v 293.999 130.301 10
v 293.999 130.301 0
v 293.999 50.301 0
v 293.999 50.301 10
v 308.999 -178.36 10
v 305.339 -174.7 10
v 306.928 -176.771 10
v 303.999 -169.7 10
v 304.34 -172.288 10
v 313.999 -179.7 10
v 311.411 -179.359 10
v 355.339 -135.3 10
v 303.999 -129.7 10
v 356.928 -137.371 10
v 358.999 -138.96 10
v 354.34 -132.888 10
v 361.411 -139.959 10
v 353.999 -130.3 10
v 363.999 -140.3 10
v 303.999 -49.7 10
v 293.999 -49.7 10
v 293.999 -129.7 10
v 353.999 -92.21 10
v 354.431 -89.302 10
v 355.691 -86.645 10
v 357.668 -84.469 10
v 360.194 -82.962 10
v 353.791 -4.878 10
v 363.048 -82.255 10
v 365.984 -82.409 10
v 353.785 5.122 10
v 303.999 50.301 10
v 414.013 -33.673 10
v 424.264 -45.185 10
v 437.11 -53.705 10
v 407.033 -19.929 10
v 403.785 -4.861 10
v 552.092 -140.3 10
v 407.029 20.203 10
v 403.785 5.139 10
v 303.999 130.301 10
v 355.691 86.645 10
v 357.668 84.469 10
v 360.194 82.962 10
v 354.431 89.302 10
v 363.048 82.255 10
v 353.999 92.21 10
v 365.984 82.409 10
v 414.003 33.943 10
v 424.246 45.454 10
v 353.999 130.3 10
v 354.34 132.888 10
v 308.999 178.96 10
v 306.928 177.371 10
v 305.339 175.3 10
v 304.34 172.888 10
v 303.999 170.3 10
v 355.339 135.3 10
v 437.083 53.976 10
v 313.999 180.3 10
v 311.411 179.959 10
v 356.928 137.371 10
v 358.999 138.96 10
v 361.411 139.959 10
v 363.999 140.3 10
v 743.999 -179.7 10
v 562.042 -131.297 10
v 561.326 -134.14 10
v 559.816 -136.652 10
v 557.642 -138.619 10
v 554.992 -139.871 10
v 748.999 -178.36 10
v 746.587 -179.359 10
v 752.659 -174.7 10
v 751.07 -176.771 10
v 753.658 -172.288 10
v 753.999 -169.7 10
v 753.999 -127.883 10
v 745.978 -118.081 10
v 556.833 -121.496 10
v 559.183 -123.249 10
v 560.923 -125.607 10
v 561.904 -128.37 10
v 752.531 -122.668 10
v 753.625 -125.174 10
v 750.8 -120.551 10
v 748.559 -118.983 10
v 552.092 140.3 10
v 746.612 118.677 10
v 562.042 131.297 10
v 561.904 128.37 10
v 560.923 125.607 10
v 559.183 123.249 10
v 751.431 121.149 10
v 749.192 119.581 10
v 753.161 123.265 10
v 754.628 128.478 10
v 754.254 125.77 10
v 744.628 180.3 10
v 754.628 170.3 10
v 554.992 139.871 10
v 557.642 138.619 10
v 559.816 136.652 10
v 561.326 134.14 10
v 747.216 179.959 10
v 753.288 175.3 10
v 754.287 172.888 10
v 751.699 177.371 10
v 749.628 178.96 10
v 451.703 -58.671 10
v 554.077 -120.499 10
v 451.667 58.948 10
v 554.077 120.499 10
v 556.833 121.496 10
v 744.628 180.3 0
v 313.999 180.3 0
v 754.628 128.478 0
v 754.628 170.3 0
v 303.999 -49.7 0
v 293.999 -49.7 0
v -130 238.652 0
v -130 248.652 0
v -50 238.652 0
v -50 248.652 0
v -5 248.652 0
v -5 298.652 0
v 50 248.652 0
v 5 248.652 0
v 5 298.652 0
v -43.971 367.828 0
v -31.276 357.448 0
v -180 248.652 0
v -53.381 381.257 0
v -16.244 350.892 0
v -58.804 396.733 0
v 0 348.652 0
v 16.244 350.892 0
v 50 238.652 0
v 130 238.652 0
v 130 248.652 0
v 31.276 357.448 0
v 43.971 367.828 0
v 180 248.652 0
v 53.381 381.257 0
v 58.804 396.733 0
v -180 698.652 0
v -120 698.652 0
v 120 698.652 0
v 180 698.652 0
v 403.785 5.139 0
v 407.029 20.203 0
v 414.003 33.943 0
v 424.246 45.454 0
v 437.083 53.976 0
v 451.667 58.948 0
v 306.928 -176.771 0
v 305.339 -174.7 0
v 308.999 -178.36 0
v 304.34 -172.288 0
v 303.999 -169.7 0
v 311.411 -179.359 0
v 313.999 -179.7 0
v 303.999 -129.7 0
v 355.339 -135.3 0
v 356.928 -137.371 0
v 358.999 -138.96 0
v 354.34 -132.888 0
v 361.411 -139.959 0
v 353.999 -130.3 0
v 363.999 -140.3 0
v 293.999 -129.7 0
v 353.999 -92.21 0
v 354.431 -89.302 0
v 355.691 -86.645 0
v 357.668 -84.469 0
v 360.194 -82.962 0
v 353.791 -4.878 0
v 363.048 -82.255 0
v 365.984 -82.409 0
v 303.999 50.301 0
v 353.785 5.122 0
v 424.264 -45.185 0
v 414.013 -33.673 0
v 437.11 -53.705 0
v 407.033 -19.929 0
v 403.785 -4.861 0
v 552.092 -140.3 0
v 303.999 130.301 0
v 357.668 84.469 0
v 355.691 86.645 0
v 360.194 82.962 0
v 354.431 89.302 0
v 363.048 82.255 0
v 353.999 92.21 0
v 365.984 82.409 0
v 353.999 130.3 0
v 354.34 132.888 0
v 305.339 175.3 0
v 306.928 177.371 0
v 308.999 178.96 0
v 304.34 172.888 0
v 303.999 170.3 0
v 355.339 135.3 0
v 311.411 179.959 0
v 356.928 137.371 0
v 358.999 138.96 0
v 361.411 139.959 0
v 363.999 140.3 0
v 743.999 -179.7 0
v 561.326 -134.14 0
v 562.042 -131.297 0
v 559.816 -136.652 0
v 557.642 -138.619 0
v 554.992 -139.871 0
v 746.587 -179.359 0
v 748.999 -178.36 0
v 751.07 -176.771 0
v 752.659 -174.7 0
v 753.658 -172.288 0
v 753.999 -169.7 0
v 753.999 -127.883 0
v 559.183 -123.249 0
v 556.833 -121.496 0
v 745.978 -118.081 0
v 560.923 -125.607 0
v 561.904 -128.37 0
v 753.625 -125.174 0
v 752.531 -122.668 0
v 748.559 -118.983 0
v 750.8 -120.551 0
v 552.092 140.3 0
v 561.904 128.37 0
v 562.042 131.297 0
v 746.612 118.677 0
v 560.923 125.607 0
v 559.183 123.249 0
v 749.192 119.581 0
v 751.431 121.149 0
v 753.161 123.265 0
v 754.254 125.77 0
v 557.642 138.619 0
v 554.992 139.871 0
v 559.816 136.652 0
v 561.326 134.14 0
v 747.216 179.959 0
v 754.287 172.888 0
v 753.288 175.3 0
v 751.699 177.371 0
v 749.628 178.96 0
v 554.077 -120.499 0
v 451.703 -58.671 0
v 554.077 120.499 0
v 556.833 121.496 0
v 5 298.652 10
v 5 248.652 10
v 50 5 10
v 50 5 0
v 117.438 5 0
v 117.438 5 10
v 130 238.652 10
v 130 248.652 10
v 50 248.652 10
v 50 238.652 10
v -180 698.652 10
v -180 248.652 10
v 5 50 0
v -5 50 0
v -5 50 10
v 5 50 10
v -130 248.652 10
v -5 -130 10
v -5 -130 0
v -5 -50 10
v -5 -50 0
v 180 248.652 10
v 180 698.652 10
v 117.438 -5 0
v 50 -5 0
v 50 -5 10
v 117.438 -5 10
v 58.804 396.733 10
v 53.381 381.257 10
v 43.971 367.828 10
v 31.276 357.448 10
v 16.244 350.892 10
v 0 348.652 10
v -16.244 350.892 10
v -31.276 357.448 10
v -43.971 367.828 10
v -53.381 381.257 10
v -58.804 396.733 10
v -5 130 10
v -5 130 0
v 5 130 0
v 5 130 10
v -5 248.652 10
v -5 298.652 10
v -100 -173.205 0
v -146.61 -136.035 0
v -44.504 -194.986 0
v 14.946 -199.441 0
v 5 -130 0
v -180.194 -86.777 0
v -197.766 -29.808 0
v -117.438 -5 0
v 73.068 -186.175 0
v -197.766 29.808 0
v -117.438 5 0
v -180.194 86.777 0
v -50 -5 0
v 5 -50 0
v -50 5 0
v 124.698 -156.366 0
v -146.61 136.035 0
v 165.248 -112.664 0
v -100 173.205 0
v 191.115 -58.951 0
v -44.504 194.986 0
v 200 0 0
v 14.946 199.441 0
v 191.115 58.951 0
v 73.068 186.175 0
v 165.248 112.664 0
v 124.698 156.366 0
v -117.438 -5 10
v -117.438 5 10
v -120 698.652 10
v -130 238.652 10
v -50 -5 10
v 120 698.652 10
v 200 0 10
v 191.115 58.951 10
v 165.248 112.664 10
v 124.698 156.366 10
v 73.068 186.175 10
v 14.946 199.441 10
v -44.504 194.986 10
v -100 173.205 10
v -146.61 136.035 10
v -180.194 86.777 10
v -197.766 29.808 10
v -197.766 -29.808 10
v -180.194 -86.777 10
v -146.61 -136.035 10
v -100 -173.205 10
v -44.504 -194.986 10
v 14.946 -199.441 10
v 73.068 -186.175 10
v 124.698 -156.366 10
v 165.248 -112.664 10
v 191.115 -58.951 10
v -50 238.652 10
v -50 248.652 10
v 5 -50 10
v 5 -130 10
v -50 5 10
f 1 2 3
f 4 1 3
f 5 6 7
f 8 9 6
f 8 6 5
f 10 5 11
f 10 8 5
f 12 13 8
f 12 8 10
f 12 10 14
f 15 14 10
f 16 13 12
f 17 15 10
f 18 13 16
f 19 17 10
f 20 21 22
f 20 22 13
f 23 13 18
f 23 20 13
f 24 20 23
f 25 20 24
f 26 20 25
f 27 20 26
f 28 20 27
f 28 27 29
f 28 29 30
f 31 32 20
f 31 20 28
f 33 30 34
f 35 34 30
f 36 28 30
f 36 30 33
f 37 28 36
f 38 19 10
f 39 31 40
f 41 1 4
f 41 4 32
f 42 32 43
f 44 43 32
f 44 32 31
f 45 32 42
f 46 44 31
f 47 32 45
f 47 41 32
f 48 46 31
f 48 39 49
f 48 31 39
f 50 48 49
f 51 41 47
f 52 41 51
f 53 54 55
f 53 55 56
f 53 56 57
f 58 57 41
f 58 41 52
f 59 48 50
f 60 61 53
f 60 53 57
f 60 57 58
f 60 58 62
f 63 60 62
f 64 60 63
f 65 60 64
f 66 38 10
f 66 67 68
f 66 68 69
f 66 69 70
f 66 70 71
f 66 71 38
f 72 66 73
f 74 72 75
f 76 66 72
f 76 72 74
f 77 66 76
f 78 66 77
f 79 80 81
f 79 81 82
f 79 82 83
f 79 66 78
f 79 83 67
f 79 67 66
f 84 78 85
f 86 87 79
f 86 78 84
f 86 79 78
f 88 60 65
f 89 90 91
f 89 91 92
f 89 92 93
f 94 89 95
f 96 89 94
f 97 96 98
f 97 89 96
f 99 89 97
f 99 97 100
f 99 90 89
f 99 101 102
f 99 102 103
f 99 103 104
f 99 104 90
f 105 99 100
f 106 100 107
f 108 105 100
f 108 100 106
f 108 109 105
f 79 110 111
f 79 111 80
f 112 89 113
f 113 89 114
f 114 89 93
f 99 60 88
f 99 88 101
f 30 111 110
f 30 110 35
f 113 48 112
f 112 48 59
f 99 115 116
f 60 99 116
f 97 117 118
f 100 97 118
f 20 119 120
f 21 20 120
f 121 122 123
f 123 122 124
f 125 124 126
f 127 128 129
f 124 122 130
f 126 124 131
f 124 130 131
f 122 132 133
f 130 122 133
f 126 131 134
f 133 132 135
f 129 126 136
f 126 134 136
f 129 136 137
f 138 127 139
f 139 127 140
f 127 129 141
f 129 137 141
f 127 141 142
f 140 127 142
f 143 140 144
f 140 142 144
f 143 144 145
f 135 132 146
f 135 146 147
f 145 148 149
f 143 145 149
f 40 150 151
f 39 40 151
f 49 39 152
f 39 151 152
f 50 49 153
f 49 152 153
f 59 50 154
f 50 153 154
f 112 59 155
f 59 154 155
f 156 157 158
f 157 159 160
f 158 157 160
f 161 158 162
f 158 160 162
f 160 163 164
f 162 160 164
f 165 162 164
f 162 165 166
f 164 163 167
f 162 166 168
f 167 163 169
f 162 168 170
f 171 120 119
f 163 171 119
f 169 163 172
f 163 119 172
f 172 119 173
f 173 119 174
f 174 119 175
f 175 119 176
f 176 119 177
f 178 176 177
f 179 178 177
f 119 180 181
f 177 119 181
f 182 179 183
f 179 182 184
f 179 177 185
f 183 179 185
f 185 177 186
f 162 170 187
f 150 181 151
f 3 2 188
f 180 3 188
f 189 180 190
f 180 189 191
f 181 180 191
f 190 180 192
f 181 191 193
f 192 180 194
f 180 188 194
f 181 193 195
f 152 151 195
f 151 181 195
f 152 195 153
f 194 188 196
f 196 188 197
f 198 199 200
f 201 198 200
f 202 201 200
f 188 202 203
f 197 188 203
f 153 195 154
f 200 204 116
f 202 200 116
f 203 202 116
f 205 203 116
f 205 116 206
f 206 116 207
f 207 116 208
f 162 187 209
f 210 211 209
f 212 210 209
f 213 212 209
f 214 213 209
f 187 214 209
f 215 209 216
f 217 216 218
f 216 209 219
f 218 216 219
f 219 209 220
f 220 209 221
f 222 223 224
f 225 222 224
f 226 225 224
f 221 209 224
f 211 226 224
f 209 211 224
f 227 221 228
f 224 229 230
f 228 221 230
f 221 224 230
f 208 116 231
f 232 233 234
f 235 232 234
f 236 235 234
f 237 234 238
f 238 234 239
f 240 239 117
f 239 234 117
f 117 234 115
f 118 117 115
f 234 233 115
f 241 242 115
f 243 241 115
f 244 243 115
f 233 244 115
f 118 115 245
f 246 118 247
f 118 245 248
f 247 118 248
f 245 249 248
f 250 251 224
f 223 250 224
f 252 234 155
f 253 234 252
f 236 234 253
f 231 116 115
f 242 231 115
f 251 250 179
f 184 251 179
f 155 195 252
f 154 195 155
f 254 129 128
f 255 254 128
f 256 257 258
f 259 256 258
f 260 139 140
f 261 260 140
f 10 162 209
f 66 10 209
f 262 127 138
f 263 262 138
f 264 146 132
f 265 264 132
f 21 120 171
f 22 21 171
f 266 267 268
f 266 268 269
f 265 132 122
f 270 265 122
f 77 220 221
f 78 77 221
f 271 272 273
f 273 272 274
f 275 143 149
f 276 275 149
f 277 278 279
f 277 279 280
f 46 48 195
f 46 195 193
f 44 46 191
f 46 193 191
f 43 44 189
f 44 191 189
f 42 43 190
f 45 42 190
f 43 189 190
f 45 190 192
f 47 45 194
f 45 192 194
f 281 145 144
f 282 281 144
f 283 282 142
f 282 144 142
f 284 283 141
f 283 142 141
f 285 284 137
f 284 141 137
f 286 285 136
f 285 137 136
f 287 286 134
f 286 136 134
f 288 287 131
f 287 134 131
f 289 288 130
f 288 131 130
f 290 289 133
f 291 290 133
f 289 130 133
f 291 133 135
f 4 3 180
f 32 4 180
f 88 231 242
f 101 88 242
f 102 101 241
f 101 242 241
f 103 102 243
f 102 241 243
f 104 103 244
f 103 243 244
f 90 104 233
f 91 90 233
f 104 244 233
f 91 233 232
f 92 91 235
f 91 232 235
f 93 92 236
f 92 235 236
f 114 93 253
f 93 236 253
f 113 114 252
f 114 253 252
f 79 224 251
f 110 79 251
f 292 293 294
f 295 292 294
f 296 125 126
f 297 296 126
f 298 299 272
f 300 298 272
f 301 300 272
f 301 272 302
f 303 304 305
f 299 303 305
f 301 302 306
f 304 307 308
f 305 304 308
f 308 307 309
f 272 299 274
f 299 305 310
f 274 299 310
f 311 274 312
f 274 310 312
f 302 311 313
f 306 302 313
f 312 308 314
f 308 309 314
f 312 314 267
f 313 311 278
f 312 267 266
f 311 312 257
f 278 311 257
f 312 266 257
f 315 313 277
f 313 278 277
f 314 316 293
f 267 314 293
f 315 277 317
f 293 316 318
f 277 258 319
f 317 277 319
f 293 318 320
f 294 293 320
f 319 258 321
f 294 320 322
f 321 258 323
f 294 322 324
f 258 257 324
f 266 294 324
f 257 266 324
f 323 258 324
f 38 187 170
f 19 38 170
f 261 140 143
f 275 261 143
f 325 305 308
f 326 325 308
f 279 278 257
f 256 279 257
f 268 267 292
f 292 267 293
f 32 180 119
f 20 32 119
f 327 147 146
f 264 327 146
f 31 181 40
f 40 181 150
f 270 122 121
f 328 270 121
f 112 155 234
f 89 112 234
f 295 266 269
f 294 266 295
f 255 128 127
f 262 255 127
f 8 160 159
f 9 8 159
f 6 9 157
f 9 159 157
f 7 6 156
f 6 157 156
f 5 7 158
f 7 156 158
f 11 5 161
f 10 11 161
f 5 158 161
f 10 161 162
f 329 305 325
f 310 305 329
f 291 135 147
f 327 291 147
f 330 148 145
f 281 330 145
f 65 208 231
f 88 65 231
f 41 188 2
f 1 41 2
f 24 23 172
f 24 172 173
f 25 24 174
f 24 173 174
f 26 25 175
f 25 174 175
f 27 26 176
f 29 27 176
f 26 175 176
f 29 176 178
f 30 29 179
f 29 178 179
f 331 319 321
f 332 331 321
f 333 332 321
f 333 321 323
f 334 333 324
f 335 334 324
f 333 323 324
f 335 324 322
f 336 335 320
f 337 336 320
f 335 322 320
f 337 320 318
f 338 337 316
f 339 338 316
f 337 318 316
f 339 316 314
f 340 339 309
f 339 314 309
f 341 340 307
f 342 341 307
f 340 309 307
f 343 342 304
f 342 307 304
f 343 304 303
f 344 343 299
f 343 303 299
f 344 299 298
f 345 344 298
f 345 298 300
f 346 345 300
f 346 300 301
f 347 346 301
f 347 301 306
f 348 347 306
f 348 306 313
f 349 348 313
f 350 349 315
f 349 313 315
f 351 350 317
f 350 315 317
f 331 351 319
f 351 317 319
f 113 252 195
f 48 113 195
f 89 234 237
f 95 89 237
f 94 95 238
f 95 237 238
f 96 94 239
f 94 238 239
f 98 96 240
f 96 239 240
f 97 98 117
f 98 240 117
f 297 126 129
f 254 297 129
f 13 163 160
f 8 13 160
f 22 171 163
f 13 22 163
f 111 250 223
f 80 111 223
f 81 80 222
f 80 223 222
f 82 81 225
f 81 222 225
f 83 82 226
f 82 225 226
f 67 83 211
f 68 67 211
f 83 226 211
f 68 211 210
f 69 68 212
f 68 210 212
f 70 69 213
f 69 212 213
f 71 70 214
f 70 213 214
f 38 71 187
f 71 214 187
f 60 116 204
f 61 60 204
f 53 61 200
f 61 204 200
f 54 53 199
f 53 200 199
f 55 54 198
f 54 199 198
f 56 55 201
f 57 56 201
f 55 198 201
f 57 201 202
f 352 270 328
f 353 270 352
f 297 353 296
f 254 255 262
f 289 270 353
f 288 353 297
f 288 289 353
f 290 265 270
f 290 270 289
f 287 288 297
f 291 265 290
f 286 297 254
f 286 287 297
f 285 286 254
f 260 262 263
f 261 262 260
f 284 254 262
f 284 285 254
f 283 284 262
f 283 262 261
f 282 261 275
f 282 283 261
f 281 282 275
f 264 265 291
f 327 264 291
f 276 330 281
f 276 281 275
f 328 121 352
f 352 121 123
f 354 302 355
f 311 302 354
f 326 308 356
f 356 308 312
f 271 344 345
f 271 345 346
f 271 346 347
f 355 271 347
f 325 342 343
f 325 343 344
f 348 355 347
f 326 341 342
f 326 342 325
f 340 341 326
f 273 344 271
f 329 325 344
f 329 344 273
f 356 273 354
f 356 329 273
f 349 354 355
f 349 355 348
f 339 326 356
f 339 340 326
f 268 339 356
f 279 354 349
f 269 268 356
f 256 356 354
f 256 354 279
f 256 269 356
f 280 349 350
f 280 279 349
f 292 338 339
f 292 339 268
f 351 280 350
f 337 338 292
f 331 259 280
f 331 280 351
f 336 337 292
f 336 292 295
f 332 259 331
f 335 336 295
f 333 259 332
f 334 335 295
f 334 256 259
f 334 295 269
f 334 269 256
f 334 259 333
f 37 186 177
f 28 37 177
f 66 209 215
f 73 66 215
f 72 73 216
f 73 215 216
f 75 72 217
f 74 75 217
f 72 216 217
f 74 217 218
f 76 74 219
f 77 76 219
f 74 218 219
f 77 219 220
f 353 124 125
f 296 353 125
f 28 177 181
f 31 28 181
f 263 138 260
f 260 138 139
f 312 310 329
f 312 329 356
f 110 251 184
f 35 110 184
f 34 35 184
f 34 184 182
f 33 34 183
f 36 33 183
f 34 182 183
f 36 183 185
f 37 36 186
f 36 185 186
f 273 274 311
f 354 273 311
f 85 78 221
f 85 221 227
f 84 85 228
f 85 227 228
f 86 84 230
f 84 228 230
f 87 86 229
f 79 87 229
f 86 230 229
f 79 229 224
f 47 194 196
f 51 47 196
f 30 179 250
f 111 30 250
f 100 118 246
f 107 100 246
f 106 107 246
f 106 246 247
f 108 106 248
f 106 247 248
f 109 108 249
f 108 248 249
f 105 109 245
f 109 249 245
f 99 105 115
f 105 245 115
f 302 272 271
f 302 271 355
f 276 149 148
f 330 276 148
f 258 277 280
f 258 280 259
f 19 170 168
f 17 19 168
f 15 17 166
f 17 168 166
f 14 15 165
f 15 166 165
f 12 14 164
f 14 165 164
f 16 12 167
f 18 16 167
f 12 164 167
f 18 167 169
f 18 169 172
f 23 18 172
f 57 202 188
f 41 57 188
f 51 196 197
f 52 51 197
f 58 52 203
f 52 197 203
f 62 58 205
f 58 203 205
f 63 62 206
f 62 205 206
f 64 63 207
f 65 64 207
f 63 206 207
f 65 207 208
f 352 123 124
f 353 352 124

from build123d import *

# Parameters (mm, degrees)
F0_R     = 200
F0_W     = 10
F0_H     = 80
F0_W_2   = 67.437902
F0_H_2   = 10
F1_DEPTH = 10


with BuildPart() as f1:
    # F0 (on Top) → F1 (new body)
    with BuildSketch(Plane.XY):
        Circle(F0_R)
        with Locations((0, -90)):
            Rectangle(F0_W, F0_H, mode=Mode.SUBTRACT)
        with Locations((-83.718951, 0)):
            Rectangle(F0_W_2, F0_H_2, mode=Mode.SUBTRACT)
        with Locations((83.718951, 0)):
            Rectangle(F0_W_2, F0_H_2, mode=Mode.SUBTRACT)
        with Locations((0, 90)):
            Rectangle(F0_W, F0_H, mode=Mode.SUBTRACT)
        with BuildLine():
            Line((-180, 698.651519), (-180, 248.651519))
            Line((-180, 248.651519), (-130, 248.651519))
            Line((-130, 248.651519), (-130, 238.651519))
            Line((-130, 238.651519), (-50, 238.651519))
            Line((-50, 238.651519), (-50, 248.651519))
            Line((-50, 248.651519), (-5, 248.651519))
            Line((-5, 248.651519), (-5, 298.651519))
            Line((-5, 298.651519), (5, 298.651519))
            Line((5, 298.651519), (5, 248.651519))
            Line((5, 248.651519), (50, 248.651519))
            Line((50, 248.651519), (50, 238.651519))
            Line((50, 238.651519), (130, 238.651519))
            Line((130, 238.651519), (130, 248.651519))
            Line((130, 248.651519), (180, 248.651519))
            Line((180, 248.651519), (180, 698.651519))
            Line((180, 698.651519), (120, 698.651519))
            Line((120, 698.651519), (58.804231, 396.732527))
            ThreePointArc((58.804231, 396.732527), (0, 348.651519), (-58.804231, 396.732527))
            Line((-58.804231, 396.732527), (-120, 698.651519))
            Line((-120, 698.651519), (-180, 698.651519))
        make_face()
        with BuildLine():
            ThreePointArc((313.999049, 180.300119), (306.927981, 177.371187), (303.999049, 170.300119))
            Line((303.999049, 170.300119), (303.999049, 130.300842))
            Line((303.999049, 130.300842), (293.999049, 130.300842))
            Line((293.999049, 130.300842), (293.999049, 50.300842))
            Line((293.999049, 50.300842), (303.999049, 50.300842))
            Line((303.999049, 50.300842), (303.999049, -49.699881))
            Line((303.999049, -49.699881), (293.999049, -49.699881))
            Line((293.999049, -49.699881), (293.999049, -129.699881))
            Line((293.999049, -129.699881), (303.999049, -129.699881))
            Line((303.999049, -129.699881), (303.999049, -169.699881))
            ThreePointArc((303.999049, -169.699881), (306.927981, -176.770949), (313.999049, -179.699881))
            Line((313.999049, -179.699881), (743.999049, -179.699881))
            ThreePointArc((743.999049, -179.699881), (751.070116, -176.770949), (753.999049, -169.699881))
            Line((753.999049, -169.699881), (753.999049, -127.882796))
            ThreePointArc((753.999049, -127.882796), (751.738205, -121.54991), (745.977958, -118.080556))
            Line((745.977958, -118.080556), (451.702737, -58.671267))
            ThreePointArc((451.702737, -58.671267), (418.767156, -39.759579), (403.785119, -4.860538))
            Line((403.785119, -4.860538), (353.790898, -4.877805))
            Line((353.790898, -4.877805), (353.784669, 5.122193))
            Line((353.784669, 5.122193), (403.784666, 5.139462))
            ThreePointArc((403.784666, 5.139462), (418.75339, 40.028464), (451.667488, 58.94849))
            Line((451.667488, 58.94849), (746.612349, 118.67698))
            ThreePointArc((746.612349, 118.67698), (752.368618, 122.147465), (754.627564, 128.478032))
            Line((754.627564, 128.478032), (754.627564, 170.300119))
            ThreePointArc((754.627564, 170.300119), (751.698632, 177.371187), (744.627564, 180.300119))
            Line((744.627564, 180.300119), (313.999049, 180.300119))
        make_face()
        with BuildLine():
            Line((353.999049, -130.300119), (353.999049, -92.20992))
            ThreePointArc((353.999049, -92.20992), (357.668482, -84.468865), (365.983833, -82.408867))
            Line((365.983833, -82.408867), (554.076796, -120.499067))
            ThreePointArc((554.076796, -120.499067), (562.04215, -131.297485), (552.092012, -140.300119))
            Line((552.092012, -140.300119), (363.999049, -140.300119))
            ThreePointArc((363.999049, -140.300119), (356.927981, -137.371187), (353.999049, -130.300119))
        make_face(mode=Mode.SUBTRACT)
        with BuildLine():
            ThreePointArc((353.999049, 130.300119), (356.927981, 137.371187), (363.999049, 140.300119))
            Line((363.999049, 140.300119), (552.092012, 140.300119))
            ThreePointArc((552.092012, 140.300119), (562.04215, 131.297485), (554.076796, 120.499067))
            Line((554.076796, 120.499067), (365.983833, 82.408867))
            ThreePointArc((365.983833, 82.408867), (357.668482, 84.468865), (353.999049, 92.20992))
            Line((353.999049, 92.20992), (353.999049, 130.300119))
        make_face(mode=Mode.SUBTRACT)
    extrude(amount=F1_DEPTH)


solid = f1.part
